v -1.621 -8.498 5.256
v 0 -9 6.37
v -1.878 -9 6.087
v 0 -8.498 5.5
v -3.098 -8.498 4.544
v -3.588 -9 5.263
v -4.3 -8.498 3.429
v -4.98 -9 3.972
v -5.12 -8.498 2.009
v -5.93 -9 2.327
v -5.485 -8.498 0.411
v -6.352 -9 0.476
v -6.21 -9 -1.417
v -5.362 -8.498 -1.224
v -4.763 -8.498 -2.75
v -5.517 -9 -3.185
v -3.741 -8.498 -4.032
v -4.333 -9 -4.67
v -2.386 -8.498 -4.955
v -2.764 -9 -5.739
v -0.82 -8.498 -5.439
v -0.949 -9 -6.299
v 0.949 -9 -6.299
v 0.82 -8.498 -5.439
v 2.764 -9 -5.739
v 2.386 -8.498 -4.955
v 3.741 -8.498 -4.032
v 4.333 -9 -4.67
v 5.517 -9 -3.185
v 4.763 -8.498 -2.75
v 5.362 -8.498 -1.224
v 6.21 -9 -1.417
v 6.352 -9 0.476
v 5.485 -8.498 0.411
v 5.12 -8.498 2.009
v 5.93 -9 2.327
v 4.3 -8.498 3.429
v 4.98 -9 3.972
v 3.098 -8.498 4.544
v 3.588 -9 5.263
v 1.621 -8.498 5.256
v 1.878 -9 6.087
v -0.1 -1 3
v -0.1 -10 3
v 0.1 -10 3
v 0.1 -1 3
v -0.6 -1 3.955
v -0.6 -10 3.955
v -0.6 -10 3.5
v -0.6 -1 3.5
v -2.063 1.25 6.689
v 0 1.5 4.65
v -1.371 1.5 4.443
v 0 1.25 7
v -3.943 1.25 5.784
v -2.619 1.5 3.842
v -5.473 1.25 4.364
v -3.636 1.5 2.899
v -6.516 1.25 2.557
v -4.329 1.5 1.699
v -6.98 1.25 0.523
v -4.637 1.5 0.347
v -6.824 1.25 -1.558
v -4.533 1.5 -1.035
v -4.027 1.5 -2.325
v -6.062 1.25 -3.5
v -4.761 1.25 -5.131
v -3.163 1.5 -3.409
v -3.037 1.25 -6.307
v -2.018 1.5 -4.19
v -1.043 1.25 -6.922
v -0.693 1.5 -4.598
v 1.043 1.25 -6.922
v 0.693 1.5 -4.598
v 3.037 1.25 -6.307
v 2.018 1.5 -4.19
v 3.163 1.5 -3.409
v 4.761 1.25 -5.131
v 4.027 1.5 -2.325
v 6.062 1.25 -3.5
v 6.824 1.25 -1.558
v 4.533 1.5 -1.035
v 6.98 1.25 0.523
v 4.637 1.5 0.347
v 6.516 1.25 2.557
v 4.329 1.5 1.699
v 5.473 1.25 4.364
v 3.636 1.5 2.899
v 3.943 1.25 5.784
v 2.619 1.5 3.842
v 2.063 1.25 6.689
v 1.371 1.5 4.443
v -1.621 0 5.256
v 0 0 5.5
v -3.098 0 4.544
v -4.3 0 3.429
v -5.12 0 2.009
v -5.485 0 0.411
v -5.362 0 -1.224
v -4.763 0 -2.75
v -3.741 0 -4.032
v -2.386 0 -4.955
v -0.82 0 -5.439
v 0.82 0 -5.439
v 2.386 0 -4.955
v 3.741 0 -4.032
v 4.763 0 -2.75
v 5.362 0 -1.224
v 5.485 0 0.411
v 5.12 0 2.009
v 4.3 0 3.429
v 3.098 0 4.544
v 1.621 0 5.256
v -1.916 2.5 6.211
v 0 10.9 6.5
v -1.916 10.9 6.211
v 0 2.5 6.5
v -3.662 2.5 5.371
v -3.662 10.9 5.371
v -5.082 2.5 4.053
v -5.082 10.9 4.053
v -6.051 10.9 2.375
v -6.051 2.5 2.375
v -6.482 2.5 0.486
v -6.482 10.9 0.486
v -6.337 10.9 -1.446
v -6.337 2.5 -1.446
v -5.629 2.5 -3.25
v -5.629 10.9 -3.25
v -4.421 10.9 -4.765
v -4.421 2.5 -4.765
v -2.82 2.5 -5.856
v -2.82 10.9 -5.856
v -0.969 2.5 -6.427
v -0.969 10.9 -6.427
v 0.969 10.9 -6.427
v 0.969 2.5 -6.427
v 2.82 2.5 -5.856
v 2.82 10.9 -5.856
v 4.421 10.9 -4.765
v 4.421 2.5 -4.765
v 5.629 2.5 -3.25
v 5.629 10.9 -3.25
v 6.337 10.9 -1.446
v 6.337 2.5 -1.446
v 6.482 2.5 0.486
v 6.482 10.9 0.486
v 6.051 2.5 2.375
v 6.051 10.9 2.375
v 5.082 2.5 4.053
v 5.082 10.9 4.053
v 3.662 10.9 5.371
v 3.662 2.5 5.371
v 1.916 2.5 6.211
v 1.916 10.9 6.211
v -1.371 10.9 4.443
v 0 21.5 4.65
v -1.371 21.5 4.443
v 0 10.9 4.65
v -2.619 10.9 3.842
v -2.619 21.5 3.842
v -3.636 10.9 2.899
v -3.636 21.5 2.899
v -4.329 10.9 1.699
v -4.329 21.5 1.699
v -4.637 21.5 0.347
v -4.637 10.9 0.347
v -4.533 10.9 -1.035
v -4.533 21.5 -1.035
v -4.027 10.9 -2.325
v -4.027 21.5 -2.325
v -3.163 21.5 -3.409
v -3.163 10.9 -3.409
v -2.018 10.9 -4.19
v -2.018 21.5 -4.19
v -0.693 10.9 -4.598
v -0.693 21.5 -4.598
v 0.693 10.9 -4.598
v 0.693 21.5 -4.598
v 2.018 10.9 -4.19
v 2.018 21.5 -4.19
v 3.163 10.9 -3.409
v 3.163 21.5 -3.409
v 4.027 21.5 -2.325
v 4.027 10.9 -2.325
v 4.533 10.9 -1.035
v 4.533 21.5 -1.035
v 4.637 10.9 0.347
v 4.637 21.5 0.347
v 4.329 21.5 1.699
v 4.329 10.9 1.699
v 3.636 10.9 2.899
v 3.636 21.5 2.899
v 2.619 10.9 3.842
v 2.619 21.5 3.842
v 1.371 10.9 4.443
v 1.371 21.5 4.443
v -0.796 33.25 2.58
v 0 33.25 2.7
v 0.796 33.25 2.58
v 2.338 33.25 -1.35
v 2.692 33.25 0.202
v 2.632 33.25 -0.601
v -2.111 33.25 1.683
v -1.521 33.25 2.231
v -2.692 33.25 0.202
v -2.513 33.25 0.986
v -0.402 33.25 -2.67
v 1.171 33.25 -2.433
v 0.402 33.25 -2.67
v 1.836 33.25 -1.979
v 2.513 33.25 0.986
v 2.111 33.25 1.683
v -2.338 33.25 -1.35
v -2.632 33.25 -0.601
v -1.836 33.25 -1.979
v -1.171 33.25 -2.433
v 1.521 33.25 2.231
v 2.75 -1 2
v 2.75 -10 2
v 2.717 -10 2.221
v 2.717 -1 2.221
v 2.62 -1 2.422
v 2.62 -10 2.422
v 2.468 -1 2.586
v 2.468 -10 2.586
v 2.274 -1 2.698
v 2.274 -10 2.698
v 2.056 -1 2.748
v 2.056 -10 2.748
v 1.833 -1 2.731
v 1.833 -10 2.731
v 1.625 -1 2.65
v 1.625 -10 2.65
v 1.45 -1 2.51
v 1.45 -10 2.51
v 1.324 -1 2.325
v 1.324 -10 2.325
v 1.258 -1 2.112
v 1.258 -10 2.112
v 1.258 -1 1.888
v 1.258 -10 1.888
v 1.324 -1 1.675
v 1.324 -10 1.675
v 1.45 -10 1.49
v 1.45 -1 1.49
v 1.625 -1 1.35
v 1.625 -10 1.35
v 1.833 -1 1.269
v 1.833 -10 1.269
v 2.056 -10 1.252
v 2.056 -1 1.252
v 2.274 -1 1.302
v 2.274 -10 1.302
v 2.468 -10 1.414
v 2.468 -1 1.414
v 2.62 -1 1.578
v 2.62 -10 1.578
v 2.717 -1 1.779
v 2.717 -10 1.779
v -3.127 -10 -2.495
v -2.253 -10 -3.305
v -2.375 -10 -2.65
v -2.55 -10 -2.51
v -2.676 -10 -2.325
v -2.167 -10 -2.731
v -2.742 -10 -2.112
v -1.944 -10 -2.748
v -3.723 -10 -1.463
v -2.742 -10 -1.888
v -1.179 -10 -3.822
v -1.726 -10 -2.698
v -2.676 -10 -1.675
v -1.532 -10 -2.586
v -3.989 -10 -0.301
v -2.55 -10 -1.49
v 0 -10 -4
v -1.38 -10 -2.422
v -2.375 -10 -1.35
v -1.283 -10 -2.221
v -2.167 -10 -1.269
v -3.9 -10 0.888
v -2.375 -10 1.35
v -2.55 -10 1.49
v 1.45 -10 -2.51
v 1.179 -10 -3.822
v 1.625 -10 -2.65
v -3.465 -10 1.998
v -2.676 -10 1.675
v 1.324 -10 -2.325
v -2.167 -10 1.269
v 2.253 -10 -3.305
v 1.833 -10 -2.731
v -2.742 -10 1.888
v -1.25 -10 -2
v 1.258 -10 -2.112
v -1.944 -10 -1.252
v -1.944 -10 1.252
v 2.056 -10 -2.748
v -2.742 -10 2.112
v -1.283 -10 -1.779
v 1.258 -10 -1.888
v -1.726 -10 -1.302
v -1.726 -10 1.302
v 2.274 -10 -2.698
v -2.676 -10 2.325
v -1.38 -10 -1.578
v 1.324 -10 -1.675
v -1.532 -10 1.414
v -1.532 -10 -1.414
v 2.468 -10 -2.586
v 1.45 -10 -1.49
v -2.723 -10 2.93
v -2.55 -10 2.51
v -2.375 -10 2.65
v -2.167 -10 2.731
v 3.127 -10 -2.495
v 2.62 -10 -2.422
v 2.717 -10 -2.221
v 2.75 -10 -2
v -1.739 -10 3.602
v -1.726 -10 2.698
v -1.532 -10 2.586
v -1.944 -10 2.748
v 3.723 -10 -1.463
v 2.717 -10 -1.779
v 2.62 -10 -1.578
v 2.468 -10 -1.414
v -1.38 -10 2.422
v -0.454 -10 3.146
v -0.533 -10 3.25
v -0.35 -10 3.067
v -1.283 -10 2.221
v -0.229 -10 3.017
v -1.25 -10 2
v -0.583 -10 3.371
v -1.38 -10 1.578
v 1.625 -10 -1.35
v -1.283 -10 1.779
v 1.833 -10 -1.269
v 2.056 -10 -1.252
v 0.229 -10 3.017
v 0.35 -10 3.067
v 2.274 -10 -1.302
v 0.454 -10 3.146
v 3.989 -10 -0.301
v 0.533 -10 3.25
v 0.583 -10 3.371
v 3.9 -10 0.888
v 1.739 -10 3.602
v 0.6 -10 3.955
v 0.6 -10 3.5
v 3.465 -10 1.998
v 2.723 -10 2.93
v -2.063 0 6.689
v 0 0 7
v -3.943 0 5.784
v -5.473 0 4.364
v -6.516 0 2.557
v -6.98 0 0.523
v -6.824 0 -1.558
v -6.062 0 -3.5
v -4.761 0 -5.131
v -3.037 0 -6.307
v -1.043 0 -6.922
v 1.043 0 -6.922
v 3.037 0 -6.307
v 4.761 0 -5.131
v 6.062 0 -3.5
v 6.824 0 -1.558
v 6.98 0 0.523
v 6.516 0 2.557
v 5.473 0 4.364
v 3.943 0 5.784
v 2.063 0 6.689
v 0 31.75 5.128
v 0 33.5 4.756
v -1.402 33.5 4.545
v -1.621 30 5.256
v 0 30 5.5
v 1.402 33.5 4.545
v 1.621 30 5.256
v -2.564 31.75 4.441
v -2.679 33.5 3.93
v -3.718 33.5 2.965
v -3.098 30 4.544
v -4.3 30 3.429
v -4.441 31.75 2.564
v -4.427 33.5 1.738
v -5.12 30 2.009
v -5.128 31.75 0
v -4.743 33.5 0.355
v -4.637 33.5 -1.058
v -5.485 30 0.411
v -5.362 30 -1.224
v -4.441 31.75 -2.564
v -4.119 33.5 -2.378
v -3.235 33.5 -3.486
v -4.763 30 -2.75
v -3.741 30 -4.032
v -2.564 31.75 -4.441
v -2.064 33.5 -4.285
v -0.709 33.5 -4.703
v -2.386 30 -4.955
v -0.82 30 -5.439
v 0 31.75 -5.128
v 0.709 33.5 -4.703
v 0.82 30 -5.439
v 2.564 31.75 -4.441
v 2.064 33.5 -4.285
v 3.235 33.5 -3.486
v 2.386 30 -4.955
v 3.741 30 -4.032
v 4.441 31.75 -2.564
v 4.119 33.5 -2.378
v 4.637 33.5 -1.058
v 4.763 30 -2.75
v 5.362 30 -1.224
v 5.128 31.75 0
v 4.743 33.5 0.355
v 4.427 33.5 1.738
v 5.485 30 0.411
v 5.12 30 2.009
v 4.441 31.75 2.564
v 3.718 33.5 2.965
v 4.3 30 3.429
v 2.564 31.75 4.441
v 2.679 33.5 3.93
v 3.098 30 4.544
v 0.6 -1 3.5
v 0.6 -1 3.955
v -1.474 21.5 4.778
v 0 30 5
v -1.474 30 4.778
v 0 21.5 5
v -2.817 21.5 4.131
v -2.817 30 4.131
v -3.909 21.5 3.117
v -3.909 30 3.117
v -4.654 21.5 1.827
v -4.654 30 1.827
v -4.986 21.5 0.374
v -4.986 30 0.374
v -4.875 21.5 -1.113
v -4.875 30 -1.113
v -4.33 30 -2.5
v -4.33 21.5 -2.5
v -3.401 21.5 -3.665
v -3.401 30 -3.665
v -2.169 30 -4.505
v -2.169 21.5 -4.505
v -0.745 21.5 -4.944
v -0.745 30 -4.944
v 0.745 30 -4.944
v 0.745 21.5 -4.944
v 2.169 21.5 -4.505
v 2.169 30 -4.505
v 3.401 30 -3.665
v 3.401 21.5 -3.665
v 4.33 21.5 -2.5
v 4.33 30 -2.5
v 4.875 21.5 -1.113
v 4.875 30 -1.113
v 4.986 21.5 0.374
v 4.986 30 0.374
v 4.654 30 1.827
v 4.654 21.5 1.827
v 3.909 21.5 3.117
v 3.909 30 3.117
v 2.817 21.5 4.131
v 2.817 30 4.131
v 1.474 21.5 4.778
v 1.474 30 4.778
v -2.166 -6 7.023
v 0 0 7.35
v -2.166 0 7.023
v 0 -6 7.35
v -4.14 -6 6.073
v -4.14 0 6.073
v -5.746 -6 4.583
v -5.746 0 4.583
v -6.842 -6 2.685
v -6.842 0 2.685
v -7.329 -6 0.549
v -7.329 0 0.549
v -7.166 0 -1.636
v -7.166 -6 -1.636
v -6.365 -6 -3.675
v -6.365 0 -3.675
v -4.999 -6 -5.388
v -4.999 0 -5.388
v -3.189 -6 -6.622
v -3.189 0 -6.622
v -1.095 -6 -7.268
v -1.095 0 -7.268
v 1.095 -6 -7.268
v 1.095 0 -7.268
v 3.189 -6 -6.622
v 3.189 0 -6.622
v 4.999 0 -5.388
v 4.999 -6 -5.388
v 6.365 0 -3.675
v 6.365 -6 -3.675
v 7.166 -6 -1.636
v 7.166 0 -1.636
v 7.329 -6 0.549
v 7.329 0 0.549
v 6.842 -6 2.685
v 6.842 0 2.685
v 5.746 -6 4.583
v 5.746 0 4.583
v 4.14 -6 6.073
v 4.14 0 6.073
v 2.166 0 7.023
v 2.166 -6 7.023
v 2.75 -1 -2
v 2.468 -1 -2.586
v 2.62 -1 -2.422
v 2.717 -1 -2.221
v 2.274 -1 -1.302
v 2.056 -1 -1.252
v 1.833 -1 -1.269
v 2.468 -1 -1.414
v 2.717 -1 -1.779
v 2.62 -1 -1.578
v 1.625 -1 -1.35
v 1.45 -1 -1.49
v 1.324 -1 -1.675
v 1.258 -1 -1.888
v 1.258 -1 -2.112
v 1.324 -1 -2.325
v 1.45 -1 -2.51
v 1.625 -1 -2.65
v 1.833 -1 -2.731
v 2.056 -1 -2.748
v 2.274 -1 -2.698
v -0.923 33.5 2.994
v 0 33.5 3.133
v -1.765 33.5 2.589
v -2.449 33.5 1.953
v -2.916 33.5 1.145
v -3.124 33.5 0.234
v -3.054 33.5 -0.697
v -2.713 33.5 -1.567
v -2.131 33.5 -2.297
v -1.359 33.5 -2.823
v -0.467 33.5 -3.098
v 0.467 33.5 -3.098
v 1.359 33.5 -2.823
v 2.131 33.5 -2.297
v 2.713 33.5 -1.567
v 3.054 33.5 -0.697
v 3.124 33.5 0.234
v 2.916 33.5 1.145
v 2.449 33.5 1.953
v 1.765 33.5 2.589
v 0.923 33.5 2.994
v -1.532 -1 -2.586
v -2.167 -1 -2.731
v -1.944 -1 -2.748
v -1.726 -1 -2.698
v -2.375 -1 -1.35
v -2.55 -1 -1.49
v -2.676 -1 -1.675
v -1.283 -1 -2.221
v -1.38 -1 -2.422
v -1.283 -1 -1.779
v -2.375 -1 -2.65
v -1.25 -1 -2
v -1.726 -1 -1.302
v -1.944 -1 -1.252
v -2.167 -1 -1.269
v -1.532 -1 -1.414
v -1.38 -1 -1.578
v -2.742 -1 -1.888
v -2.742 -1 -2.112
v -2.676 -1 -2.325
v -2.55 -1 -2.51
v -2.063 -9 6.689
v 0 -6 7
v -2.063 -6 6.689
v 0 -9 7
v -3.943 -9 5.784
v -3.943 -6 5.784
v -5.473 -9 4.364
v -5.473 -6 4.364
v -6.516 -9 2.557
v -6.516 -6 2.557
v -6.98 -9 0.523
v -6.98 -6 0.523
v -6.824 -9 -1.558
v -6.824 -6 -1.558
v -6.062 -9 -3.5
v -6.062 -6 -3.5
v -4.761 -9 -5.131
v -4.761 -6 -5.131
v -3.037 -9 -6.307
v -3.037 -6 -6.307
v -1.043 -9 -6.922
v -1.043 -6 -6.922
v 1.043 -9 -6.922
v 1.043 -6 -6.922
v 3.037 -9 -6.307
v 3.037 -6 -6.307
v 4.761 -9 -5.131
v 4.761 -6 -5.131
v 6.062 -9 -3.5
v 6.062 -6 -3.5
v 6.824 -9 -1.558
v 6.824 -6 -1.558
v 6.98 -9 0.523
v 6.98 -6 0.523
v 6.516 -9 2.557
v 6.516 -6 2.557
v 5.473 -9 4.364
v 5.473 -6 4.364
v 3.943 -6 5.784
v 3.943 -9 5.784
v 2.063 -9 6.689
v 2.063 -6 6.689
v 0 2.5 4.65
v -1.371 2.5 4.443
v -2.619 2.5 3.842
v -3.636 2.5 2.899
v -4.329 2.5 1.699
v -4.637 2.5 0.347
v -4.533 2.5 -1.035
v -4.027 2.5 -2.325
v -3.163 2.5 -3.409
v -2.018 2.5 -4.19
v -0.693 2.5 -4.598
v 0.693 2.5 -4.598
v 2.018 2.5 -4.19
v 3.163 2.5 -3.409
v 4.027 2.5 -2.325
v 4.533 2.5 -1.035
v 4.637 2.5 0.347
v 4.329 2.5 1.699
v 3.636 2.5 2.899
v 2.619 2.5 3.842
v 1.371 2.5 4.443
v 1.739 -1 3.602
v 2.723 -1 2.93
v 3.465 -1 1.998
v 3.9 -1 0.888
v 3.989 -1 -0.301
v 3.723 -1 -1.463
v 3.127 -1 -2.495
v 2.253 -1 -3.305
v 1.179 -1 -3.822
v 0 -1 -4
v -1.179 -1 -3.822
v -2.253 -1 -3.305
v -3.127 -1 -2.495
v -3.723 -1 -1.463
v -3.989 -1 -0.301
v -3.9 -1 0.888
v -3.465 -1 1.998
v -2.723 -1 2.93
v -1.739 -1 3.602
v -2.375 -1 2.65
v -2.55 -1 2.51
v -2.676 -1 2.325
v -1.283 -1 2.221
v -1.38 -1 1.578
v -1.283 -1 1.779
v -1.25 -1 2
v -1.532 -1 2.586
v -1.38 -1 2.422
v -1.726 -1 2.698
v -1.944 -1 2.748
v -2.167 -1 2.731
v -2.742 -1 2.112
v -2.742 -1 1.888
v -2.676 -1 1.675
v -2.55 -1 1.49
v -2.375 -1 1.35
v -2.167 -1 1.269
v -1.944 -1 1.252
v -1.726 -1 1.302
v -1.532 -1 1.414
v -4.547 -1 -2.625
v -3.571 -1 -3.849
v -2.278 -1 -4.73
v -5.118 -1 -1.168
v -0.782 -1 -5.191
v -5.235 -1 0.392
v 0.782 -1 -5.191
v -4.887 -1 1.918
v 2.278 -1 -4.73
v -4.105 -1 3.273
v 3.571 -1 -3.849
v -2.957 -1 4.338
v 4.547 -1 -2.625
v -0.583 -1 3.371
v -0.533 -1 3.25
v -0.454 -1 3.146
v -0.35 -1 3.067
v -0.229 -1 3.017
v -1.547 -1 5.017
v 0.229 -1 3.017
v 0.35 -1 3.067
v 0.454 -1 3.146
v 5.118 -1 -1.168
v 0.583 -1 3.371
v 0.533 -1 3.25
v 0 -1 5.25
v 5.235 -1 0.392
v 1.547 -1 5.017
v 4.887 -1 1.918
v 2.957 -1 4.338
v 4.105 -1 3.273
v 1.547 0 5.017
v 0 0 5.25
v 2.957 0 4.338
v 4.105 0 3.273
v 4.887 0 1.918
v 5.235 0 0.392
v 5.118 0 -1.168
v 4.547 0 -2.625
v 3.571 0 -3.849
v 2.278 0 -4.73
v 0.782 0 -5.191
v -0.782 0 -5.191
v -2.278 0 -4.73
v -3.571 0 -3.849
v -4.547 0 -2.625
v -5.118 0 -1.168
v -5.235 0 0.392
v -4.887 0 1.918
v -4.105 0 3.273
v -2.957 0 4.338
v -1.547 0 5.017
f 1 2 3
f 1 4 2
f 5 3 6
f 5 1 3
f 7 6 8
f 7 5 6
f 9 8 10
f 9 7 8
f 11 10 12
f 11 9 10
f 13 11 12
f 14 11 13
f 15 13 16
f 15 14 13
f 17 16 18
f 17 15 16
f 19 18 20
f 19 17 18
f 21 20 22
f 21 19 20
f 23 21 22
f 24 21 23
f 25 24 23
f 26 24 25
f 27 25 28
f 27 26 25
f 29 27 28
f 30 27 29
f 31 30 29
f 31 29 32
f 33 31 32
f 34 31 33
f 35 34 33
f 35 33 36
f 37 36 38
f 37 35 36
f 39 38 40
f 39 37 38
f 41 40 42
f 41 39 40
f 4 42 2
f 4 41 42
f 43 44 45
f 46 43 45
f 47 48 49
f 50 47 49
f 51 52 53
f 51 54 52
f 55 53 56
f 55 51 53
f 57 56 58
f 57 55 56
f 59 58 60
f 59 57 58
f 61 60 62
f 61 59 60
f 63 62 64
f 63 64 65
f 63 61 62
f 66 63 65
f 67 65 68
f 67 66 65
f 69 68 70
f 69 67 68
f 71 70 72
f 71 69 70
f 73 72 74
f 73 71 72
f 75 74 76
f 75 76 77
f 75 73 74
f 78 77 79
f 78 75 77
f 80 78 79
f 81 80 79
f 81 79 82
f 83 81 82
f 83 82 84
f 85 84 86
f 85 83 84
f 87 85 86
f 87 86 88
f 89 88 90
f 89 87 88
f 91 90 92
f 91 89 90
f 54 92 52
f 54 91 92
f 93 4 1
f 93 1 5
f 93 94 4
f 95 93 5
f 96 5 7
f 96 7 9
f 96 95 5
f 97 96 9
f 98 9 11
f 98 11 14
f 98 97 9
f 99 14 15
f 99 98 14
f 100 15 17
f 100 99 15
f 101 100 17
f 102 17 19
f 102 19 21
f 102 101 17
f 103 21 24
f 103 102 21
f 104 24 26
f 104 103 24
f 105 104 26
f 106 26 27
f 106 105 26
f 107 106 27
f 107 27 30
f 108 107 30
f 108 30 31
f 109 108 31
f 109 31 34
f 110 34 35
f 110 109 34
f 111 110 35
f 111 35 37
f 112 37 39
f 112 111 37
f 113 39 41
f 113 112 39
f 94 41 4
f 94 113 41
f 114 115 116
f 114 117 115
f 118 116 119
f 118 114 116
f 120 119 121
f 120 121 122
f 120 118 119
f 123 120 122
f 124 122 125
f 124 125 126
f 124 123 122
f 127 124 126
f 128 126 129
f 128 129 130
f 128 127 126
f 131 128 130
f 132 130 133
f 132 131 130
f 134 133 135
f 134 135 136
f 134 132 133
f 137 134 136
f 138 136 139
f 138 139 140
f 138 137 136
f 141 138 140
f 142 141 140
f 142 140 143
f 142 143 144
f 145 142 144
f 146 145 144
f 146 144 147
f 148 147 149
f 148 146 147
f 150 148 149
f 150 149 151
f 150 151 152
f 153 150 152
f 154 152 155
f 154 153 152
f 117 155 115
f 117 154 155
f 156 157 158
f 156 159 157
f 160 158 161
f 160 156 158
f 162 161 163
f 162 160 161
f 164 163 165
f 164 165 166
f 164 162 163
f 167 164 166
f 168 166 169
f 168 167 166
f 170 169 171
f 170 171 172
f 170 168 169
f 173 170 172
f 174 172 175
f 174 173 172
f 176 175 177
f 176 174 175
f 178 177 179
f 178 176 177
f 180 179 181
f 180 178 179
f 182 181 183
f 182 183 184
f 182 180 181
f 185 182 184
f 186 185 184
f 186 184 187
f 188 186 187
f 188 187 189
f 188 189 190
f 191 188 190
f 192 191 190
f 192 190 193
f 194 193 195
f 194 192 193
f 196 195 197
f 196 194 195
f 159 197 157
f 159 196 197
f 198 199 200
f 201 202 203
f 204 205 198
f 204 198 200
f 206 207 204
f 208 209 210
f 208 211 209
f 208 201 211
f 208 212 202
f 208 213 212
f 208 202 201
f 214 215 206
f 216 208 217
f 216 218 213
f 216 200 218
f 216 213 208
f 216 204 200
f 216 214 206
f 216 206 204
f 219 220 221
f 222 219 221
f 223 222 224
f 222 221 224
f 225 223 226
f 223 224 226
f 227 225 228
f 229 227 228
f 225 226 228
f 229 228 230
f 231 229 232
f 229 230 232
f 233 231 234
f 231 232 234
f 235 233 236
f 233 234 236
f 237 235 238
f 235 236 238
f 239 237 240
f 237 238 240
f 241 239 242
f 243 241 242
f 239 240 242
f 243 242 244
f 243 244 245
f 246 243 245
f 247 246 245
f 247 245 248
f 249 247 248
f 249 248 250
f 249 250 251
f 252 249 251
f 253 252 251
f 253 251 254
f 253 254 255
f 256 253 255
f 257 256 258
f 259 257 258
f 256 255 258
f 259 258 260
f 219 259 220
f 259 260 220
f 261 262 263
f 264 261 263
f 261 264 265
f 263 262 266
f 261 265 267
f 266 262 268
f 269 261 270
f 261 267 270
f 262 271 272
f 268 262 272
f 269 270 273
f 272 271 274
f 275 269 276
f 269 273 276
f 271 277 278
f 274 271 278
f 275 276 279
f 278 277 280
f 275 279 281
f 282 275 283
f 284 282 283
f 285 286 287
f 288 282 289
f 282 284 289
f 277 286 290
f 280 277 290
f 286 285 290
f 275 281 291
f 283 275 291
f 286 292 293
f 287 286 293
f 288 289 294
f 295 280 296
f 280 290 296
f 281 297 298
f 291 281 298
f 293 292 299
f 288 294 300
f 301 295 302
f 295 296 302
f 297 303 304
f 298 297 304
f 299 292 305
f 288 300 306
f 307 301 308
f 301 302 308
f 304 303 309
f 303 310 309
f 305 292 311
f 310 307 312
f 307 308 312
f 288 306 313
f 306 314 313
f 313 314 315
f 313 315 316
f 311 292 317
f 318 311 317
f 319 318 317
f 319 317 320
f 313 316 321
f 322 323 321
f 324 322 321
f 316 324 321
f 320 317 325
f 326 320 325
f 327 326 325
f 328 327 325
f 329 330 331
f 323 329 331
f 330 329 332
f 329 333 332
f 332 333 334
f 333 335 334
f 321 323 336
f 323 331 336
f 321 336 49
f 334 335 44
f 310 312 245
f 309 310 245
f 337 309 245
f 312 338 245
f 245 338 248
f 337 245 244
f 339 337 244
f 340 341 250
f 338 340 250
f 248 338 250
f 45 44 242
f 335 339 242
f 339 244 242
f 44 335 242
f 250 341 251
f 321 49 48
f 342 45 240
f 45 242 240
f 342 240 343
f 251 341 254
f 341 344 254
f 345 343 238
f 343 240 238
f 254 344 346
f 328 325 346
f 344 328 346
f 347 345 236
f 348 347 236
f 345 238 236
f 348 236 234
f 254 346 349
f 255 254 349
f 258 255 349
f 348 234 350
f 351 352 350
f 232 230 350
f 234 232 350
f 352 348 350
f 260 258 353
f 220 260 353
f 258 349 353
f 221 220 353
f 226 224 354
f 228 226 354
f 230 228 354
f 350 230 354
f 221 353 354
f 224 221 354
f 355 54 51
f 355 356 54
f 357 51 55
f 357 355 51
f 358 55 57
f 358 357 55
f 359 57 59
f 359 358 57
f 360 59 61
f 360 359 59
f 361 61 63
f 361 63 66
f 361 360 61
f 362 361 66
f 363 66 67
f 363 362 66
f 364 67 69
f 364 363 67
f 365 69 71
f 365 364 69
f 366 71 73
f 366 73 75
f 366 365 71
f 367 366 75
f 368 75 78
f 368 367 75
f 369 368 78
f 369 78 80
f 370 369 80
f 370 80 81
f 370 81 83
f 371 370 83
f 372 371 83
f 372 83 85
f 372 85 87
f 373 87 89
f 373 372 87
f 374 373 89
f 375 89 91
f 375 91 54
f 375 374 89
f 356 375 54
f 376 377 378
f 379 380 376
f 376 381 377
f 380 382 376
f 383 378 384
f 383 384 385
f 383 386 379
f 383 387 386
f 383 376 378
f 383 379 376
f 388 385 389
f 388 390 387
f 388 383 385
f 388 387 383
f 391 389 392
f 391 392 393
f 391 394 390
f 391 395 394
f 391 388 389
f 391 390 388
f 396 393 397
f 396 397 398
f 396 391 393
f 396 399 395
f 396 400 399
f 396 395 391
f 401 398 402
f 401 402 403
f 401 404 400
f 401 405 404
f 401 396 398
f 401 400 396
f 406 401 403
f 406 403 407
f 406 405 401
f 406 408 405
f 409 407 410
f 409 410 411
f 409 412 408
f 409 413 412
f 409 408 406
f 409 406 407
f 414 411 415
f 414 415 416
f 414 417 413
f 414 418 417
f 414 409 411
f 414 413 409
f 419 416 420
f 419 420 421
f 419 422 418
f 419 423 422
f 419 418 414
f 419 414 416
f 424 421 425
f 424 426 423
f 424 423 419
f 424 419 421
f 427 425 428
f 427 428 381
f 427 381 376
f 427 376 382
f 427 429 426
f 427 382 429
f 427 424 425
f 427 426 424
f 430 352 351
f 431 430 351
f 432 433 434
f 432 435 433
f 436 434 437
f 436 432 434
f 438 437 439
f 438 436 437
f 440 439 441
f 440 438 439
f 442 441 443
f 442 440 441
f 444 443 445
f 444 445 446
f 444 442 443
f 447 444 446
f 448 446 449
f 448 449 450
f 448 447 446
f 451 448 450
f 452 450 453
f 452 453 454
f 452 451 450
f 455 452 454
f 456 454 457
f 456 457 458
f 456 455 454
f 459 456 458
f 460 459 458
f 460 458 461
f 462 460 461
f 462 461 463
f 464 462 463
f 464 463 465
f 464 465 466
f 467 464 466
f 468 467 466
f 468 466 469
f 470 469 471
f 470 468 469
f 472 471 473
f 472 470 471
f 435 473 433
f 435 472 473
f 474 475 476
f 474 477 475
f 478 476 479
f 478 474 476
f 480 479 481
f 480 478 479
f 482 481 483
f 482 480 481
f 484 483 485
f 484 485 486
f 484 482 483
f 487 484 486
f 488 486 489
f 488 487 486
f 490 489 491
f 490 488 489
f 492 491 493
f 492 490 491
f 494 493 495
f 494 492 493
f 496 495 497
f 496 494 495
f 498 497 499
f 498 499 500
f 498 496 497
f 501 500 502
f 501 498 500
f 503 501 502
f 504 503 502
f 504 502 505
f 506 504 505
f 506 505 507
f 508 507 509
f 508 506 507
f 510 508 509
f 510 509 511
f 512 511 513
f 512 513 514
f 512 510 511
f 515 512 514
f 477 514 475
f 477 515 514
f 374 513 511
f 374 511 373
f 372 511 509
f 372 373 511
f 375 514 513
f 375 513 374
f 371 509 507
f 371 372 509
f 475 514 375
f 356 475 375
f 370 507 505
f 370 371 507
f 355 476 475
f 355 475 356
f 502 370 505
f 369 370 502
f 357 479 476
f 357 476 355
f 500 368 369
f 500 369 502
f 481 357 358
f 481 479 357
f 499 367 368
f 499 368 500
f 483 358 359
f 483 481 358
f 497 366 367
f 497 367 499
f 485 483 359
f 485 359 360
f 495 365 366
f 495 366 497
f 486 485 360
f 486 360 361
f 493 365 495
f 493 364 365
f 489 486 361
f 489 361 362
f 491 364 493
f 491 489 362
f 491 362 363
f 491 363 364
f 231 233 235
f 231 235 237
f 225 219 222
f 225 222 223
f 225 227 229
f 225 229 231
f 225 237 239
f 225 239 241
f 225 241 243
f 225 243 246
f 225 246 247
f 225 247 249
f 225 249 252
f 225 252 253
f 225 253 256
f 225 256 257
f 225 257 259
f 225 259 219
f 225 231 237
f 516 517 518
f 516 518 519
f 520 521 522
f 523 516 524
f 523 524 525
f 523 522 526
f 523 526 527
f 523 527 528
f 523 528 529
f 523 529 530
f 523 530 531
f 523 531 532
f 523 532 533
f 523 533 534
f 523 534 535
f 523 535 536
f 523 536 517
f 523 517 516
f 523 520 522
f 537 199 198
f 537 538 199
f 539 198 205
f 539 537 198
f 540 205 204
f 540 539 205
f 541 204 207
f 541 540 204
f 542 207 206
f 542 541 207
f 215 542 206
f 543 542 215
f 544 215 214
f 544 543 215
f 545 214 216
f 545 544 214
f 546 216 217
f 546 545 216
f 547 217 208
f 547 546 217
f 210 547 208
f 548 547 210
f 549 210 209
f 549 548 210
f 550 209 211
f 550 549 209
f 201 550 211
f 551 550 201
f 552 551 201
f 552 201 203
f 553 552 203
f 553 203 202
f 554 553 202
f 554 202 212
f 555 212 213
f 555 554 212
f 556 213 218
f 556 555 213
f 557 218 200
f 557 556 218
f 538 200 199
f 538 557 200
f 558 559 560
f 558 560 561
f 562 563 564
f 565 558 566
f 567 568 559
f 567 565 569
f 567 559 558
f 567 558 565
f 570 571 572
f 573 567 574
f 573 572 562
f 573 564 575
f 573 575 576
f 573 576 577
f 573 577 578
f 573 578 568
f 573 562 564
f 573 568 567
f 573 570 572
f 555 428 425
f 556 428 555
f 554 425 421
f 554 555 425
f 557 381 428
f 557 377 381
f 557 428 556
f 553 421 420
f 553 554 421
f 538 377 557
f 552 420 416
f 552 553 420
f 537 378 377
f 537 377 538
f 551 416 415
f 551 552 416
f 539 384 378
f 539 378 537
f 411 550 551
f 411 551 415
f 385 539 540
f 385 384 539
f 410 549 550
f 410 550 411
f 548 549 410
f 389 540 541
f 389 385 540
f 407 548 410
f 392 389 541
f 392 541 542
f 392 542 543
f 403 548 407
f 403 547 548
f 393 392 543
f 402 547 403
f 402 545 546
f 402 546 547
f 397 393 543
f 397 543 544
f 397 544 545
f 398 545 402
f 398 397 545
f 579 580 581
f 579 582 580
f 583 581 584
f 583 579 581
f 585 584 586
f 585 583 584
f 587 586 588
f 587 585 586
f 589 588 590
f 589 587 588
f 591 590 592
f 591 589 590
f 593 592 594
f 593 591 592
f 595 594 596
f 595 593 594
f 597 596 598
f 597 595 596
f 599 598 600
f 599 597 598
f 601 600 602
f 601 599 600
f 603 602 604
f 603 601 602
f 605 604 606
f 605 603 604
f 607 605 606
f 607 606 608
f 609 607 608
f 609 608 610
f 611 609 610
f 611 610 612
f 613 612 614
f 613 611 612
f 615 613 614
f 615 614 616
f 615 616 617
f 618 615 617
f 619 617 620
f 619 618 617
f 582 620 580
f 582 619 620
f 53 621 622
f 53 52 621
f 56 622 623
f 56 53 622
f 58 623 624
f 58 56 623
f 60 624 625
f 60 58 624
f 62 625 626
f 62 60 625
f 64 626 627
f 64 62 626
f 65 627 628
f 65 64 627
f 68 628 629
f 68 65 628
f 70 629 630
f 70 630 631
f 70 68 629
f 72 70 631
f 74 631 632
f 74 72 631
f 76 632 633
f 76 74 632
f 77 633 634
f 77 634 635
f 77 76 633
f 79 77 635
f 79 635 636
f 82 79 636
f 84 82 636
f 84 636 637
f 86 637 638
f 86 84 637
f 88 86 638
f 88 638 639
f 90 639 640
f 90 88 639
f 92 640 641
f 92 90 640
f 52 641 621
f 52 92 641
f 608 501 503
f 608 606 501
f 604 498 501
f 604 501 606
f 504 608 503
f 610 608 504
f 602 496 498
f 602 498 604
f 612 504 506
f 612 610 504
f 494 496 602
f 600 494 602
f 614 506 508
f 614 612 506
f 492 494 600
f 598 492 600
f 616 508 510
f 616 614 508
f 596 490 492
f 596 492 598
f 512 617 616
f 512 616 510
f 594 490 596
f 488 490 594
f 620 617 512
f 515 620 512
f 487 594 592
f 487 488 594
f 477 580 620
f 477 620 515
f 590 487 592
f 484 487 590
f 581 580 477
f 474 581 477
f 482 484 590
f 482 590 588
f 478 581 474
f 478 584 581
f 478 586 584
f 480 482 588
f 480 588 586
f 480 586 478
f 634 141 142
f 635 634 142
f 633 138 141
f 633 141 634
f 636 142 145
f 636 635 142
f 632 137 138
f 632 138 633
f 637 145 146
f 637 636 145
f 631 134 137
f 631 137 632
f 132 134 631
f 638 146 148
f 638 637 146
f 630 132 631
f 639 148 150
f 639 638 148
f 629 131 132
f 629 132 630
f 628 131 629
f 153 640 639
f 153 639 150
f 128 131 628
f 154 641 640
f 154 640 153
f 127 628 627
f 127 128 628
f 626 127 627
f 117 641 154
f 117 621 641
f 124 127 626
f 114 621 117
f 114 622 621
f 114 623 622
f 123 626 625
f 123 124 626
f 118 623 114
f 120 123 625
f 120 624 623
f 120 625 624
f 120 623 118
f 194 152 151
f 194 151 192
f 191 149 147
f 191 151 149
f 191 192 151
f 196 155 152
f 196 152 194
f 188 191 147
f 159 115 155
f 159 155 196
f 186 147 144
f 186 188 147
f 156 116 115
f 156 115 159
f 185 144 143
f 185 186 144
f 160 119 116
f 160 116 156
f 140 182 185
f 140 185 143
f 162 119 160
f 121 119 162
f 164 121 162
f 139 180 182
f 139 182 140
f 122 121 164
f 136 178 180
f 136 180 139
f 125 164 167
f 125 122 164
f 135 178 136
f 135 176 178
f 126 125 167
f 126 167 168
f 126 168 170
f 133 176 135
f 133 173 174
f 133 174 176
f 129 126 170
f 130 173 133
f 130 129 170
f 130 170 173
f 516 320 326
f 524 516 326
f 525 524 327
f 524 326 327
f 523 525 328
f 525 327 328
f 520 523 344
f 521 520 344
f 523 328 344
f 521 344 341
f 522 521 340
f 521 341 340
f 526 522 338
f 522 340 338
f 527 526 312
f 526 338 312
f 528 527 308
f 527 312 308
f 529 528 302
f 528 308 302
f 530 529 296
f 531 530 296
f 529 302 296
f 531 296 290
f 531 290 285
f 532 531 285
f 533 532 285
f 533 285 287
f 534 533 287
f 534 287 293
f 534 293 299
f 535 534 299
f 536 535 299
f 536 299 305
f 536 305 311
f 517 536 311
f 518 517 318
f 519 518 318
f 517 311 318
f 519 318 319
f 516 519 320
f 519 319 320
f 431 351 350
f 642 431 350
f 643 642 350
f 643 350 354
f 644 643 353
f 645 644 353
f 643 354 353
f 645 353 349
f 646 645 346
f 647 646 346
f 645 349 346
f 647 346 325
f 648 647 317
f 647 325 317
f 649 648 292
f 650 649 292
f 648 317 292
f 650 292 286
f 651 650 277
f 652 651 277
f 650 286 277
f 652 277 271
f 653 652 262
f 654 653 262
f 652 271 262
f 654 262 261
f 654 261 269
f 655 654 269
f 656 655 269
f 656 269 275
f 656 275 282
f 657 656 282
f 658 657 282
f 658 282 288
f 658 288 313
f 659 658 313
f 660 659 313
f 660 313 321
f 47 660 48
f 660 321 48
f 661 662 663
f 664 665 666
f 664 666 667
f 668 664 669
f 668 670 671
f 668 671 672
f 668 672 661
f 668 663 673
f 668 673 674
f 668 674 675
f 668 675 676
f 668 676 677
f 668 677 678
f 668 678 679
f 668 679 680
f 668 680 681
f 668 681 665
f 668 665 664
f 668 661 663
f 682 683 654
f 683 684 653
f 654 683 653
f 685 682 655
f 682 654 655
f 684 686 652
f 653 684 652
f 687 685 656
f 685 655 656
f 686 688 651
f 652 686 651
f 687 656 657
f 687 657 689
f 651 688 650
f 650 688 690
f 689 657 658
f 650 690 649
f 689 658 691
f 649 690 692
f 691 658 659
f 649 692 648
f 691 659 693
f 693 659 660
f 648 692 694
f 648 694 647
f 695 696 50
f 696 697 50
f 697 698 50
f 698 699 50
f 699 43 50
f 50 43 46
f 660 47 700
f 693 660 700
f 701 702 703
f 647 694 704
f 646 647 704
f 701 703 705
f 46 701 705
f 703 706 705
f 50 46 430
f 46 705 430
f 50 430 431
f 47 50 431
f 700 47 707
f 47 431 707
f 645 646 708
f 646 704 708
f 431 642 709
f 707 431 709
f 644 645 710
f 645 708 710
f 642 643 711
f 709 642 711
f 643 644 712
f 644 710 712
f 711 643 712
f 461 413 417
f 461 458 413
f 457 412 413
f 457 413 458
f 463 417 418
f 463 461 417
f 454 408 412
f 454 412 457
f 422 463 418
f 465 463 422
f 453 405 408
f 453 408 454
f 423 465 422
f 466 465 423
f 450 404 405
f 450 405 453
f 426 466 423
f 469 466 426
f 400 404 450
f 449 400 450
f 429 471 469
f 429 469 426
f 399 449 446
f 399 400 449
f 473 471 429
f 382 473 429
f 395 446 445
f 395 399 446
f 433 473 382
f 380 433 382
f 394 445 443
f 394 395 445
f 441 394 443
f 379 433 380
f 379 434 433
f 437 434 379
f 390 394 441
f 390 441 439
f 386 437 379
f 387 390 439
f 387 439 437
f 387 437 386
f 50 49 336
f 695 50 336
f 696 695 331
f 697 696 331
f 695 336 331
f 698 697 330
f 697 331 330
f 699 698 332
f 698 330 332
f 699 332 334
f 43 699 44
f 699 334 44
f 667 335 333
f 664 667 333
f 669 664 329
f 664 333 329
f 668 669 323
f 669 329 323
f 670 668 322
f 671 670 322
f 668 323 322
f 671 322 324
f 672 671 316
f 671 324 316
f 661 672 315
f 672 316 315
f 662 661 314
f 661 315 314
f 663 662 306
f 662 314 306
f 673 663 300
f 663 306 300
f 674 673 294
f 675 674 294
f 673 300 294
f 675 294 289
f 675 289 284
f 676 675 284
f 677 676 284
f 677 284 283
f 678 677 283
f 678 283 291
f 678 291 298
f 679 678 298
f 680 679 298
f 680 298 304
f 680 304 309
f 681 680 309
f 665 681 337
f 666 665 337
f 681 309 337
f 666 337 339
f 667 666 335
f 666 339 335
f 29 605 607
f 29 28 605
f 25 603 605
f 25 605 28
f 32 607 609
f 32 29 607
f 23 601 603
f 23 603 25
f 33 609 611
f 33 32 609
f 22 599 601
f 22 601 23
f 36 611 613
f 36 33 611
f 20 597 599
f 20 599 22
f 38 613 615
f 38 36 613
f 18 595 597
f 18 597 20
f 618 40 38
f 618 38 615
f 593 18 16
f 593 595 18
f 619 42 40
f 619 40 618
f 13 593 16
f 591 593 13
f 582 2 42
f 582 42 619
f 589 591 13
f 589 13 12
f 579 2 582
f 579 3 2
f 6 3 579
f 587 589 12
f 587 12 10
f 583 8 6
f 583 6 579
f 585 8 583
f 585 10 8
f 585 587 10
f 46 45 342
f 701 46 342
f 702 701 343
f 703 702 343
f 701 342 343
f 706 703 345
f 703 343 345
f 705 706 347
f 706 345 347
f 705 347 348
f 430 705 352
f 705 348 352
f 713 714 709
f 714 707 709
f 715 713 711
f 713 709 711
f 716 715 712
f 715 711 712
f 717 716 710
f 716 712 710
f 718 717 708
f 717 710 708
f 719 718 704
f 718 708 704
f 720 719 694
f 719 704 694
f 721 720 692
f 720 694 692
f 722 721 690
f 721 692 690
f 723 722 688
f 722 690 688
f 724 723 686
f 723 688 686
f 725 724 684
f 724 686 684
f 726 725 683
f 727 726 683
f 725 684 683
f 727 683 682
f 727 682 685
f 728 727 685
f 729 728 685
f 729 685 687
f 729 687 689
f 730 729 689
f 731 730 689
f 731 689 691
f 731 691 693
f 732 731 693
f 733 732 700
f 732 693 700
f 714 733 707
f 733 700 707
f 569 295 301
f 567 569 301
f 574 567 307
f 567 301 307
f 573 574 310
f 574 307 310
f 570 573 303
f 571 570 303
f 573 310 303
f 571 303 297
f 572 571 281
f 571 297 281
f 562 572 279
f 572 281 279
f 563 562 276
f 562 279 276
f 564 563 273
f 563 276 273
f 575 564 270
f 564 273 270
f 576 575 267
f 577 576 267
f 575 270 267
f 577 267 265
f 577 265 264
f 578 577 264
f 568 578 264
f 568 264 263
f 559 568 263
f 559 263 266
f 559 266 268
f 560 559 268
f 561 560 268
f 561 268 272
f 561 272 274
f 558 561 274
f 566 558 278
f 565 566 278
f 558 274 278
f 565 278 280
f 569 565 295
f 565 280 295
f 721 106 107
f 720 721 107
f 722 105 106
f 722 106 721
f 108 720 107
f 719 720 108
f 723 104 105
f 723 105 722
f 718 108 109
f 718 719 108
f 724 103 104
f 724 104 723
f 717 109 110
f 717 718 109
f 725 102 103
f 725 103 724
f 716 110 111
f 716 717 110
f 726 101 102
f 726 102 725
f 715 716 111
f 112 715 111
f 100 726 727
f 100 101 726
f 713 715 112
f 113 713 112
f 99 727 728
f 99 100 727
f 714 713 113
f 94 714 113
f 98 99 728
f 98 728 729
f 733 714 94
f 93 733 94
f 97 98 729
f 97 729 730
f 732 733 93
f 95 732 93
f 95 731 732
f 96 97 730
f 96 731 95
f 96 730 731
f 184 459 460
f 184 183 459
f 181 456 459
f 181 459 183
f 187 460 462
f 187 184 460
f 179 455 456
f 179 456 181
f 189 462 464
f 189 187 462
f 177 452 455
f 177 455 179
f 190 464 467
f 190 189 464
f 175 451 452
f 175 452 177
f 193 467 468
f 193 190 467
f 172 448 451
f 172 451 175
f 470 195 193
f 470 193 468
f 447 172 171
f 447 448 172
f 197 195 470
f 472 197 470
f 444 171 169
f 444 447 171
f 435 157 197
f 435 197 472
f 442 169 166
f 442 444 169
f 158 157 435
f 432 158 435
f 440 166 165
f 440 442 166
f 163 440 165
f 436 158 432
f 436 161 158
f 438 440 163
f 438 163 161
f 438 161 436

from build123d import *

# Parameters (mm, degrees)
F6_R     = 0.75
F7_DEPTH = 9


with BuildPart() as f1:
    # F0 (on Right) → F1 (revolve)
    with BuildSketch(Plane.YZ):
        Polygon((1.25, 7), (0, 7), (0, 0), (33.25, 0), (33.25, 2.7), (33.5, 3.133013), (33.5, 4.756052), (30, 5.5), (30, 5), (21.5, 5), (21.5, 4.65), (10.9, 4.65), (10.9, 6.5), (2.5, 6.5), (2.5, 4.65), (1.5, 4.65), align=None)
    revolve(axis=Axis((0, -17.104737, 0), (0, -1, 0)))

    # F2 (on Right) → F3 (revolve)
    with BuildSketch(Plane.YZ):
        Polygon((-8.497705, 5.5), (0, 5.5), (0, 7.35), (-6, 7.35), (-6, 7), (-9, 7), (-9, 6.37), align=None)
    revolve(axis=Axis((0, -12.747619, 0), (0, -1, 0)))

    # F4 (on Right) → F5 (revolve)
    with BuildSketch(Plane.YZ):
        Polygon((-10, 0), (0, 0), (0, 5.25), (-1, 5.25), (-1, 4), (-10, 4), align=None)
    revolve(axis=Axis((0, -5, 0), (0, 1, 0)))

    # F6 (on face) → F7 (cut, through all)
    with BuildSketch(Plane.XZ.offset(10)):
        with Locations((-2, 2)):
            Circle(F6_R)
        with Locations((2, 2)):
            Circle(F6_R)
        with Locations((2, -2)):
            Circle(F6_R)
        with Locations((-2, -2)):
            Circle(F6_R)
        with BuildLine():
            ThreePointArc((-0.6, 3.5), (-0.453553, 3.146447), (-0.1, 3))
            Line((-0.1, 3), (0.1, 3))
            ThreePointArc((0.1, 3), (0.453553, 3.146447), (0.6, 3.5))
            Line((0.6, 3.5), (0.6, 4.5))
            Line((0.6, 4.5), (-0.6, 4.5))
            Line((-0.6, 4.5), (-0.6, 3.5))
        make_face()
    extrude(amount=-F7_DEPTH, mode=Mode.SUBTRACT)


solid = f1.part
